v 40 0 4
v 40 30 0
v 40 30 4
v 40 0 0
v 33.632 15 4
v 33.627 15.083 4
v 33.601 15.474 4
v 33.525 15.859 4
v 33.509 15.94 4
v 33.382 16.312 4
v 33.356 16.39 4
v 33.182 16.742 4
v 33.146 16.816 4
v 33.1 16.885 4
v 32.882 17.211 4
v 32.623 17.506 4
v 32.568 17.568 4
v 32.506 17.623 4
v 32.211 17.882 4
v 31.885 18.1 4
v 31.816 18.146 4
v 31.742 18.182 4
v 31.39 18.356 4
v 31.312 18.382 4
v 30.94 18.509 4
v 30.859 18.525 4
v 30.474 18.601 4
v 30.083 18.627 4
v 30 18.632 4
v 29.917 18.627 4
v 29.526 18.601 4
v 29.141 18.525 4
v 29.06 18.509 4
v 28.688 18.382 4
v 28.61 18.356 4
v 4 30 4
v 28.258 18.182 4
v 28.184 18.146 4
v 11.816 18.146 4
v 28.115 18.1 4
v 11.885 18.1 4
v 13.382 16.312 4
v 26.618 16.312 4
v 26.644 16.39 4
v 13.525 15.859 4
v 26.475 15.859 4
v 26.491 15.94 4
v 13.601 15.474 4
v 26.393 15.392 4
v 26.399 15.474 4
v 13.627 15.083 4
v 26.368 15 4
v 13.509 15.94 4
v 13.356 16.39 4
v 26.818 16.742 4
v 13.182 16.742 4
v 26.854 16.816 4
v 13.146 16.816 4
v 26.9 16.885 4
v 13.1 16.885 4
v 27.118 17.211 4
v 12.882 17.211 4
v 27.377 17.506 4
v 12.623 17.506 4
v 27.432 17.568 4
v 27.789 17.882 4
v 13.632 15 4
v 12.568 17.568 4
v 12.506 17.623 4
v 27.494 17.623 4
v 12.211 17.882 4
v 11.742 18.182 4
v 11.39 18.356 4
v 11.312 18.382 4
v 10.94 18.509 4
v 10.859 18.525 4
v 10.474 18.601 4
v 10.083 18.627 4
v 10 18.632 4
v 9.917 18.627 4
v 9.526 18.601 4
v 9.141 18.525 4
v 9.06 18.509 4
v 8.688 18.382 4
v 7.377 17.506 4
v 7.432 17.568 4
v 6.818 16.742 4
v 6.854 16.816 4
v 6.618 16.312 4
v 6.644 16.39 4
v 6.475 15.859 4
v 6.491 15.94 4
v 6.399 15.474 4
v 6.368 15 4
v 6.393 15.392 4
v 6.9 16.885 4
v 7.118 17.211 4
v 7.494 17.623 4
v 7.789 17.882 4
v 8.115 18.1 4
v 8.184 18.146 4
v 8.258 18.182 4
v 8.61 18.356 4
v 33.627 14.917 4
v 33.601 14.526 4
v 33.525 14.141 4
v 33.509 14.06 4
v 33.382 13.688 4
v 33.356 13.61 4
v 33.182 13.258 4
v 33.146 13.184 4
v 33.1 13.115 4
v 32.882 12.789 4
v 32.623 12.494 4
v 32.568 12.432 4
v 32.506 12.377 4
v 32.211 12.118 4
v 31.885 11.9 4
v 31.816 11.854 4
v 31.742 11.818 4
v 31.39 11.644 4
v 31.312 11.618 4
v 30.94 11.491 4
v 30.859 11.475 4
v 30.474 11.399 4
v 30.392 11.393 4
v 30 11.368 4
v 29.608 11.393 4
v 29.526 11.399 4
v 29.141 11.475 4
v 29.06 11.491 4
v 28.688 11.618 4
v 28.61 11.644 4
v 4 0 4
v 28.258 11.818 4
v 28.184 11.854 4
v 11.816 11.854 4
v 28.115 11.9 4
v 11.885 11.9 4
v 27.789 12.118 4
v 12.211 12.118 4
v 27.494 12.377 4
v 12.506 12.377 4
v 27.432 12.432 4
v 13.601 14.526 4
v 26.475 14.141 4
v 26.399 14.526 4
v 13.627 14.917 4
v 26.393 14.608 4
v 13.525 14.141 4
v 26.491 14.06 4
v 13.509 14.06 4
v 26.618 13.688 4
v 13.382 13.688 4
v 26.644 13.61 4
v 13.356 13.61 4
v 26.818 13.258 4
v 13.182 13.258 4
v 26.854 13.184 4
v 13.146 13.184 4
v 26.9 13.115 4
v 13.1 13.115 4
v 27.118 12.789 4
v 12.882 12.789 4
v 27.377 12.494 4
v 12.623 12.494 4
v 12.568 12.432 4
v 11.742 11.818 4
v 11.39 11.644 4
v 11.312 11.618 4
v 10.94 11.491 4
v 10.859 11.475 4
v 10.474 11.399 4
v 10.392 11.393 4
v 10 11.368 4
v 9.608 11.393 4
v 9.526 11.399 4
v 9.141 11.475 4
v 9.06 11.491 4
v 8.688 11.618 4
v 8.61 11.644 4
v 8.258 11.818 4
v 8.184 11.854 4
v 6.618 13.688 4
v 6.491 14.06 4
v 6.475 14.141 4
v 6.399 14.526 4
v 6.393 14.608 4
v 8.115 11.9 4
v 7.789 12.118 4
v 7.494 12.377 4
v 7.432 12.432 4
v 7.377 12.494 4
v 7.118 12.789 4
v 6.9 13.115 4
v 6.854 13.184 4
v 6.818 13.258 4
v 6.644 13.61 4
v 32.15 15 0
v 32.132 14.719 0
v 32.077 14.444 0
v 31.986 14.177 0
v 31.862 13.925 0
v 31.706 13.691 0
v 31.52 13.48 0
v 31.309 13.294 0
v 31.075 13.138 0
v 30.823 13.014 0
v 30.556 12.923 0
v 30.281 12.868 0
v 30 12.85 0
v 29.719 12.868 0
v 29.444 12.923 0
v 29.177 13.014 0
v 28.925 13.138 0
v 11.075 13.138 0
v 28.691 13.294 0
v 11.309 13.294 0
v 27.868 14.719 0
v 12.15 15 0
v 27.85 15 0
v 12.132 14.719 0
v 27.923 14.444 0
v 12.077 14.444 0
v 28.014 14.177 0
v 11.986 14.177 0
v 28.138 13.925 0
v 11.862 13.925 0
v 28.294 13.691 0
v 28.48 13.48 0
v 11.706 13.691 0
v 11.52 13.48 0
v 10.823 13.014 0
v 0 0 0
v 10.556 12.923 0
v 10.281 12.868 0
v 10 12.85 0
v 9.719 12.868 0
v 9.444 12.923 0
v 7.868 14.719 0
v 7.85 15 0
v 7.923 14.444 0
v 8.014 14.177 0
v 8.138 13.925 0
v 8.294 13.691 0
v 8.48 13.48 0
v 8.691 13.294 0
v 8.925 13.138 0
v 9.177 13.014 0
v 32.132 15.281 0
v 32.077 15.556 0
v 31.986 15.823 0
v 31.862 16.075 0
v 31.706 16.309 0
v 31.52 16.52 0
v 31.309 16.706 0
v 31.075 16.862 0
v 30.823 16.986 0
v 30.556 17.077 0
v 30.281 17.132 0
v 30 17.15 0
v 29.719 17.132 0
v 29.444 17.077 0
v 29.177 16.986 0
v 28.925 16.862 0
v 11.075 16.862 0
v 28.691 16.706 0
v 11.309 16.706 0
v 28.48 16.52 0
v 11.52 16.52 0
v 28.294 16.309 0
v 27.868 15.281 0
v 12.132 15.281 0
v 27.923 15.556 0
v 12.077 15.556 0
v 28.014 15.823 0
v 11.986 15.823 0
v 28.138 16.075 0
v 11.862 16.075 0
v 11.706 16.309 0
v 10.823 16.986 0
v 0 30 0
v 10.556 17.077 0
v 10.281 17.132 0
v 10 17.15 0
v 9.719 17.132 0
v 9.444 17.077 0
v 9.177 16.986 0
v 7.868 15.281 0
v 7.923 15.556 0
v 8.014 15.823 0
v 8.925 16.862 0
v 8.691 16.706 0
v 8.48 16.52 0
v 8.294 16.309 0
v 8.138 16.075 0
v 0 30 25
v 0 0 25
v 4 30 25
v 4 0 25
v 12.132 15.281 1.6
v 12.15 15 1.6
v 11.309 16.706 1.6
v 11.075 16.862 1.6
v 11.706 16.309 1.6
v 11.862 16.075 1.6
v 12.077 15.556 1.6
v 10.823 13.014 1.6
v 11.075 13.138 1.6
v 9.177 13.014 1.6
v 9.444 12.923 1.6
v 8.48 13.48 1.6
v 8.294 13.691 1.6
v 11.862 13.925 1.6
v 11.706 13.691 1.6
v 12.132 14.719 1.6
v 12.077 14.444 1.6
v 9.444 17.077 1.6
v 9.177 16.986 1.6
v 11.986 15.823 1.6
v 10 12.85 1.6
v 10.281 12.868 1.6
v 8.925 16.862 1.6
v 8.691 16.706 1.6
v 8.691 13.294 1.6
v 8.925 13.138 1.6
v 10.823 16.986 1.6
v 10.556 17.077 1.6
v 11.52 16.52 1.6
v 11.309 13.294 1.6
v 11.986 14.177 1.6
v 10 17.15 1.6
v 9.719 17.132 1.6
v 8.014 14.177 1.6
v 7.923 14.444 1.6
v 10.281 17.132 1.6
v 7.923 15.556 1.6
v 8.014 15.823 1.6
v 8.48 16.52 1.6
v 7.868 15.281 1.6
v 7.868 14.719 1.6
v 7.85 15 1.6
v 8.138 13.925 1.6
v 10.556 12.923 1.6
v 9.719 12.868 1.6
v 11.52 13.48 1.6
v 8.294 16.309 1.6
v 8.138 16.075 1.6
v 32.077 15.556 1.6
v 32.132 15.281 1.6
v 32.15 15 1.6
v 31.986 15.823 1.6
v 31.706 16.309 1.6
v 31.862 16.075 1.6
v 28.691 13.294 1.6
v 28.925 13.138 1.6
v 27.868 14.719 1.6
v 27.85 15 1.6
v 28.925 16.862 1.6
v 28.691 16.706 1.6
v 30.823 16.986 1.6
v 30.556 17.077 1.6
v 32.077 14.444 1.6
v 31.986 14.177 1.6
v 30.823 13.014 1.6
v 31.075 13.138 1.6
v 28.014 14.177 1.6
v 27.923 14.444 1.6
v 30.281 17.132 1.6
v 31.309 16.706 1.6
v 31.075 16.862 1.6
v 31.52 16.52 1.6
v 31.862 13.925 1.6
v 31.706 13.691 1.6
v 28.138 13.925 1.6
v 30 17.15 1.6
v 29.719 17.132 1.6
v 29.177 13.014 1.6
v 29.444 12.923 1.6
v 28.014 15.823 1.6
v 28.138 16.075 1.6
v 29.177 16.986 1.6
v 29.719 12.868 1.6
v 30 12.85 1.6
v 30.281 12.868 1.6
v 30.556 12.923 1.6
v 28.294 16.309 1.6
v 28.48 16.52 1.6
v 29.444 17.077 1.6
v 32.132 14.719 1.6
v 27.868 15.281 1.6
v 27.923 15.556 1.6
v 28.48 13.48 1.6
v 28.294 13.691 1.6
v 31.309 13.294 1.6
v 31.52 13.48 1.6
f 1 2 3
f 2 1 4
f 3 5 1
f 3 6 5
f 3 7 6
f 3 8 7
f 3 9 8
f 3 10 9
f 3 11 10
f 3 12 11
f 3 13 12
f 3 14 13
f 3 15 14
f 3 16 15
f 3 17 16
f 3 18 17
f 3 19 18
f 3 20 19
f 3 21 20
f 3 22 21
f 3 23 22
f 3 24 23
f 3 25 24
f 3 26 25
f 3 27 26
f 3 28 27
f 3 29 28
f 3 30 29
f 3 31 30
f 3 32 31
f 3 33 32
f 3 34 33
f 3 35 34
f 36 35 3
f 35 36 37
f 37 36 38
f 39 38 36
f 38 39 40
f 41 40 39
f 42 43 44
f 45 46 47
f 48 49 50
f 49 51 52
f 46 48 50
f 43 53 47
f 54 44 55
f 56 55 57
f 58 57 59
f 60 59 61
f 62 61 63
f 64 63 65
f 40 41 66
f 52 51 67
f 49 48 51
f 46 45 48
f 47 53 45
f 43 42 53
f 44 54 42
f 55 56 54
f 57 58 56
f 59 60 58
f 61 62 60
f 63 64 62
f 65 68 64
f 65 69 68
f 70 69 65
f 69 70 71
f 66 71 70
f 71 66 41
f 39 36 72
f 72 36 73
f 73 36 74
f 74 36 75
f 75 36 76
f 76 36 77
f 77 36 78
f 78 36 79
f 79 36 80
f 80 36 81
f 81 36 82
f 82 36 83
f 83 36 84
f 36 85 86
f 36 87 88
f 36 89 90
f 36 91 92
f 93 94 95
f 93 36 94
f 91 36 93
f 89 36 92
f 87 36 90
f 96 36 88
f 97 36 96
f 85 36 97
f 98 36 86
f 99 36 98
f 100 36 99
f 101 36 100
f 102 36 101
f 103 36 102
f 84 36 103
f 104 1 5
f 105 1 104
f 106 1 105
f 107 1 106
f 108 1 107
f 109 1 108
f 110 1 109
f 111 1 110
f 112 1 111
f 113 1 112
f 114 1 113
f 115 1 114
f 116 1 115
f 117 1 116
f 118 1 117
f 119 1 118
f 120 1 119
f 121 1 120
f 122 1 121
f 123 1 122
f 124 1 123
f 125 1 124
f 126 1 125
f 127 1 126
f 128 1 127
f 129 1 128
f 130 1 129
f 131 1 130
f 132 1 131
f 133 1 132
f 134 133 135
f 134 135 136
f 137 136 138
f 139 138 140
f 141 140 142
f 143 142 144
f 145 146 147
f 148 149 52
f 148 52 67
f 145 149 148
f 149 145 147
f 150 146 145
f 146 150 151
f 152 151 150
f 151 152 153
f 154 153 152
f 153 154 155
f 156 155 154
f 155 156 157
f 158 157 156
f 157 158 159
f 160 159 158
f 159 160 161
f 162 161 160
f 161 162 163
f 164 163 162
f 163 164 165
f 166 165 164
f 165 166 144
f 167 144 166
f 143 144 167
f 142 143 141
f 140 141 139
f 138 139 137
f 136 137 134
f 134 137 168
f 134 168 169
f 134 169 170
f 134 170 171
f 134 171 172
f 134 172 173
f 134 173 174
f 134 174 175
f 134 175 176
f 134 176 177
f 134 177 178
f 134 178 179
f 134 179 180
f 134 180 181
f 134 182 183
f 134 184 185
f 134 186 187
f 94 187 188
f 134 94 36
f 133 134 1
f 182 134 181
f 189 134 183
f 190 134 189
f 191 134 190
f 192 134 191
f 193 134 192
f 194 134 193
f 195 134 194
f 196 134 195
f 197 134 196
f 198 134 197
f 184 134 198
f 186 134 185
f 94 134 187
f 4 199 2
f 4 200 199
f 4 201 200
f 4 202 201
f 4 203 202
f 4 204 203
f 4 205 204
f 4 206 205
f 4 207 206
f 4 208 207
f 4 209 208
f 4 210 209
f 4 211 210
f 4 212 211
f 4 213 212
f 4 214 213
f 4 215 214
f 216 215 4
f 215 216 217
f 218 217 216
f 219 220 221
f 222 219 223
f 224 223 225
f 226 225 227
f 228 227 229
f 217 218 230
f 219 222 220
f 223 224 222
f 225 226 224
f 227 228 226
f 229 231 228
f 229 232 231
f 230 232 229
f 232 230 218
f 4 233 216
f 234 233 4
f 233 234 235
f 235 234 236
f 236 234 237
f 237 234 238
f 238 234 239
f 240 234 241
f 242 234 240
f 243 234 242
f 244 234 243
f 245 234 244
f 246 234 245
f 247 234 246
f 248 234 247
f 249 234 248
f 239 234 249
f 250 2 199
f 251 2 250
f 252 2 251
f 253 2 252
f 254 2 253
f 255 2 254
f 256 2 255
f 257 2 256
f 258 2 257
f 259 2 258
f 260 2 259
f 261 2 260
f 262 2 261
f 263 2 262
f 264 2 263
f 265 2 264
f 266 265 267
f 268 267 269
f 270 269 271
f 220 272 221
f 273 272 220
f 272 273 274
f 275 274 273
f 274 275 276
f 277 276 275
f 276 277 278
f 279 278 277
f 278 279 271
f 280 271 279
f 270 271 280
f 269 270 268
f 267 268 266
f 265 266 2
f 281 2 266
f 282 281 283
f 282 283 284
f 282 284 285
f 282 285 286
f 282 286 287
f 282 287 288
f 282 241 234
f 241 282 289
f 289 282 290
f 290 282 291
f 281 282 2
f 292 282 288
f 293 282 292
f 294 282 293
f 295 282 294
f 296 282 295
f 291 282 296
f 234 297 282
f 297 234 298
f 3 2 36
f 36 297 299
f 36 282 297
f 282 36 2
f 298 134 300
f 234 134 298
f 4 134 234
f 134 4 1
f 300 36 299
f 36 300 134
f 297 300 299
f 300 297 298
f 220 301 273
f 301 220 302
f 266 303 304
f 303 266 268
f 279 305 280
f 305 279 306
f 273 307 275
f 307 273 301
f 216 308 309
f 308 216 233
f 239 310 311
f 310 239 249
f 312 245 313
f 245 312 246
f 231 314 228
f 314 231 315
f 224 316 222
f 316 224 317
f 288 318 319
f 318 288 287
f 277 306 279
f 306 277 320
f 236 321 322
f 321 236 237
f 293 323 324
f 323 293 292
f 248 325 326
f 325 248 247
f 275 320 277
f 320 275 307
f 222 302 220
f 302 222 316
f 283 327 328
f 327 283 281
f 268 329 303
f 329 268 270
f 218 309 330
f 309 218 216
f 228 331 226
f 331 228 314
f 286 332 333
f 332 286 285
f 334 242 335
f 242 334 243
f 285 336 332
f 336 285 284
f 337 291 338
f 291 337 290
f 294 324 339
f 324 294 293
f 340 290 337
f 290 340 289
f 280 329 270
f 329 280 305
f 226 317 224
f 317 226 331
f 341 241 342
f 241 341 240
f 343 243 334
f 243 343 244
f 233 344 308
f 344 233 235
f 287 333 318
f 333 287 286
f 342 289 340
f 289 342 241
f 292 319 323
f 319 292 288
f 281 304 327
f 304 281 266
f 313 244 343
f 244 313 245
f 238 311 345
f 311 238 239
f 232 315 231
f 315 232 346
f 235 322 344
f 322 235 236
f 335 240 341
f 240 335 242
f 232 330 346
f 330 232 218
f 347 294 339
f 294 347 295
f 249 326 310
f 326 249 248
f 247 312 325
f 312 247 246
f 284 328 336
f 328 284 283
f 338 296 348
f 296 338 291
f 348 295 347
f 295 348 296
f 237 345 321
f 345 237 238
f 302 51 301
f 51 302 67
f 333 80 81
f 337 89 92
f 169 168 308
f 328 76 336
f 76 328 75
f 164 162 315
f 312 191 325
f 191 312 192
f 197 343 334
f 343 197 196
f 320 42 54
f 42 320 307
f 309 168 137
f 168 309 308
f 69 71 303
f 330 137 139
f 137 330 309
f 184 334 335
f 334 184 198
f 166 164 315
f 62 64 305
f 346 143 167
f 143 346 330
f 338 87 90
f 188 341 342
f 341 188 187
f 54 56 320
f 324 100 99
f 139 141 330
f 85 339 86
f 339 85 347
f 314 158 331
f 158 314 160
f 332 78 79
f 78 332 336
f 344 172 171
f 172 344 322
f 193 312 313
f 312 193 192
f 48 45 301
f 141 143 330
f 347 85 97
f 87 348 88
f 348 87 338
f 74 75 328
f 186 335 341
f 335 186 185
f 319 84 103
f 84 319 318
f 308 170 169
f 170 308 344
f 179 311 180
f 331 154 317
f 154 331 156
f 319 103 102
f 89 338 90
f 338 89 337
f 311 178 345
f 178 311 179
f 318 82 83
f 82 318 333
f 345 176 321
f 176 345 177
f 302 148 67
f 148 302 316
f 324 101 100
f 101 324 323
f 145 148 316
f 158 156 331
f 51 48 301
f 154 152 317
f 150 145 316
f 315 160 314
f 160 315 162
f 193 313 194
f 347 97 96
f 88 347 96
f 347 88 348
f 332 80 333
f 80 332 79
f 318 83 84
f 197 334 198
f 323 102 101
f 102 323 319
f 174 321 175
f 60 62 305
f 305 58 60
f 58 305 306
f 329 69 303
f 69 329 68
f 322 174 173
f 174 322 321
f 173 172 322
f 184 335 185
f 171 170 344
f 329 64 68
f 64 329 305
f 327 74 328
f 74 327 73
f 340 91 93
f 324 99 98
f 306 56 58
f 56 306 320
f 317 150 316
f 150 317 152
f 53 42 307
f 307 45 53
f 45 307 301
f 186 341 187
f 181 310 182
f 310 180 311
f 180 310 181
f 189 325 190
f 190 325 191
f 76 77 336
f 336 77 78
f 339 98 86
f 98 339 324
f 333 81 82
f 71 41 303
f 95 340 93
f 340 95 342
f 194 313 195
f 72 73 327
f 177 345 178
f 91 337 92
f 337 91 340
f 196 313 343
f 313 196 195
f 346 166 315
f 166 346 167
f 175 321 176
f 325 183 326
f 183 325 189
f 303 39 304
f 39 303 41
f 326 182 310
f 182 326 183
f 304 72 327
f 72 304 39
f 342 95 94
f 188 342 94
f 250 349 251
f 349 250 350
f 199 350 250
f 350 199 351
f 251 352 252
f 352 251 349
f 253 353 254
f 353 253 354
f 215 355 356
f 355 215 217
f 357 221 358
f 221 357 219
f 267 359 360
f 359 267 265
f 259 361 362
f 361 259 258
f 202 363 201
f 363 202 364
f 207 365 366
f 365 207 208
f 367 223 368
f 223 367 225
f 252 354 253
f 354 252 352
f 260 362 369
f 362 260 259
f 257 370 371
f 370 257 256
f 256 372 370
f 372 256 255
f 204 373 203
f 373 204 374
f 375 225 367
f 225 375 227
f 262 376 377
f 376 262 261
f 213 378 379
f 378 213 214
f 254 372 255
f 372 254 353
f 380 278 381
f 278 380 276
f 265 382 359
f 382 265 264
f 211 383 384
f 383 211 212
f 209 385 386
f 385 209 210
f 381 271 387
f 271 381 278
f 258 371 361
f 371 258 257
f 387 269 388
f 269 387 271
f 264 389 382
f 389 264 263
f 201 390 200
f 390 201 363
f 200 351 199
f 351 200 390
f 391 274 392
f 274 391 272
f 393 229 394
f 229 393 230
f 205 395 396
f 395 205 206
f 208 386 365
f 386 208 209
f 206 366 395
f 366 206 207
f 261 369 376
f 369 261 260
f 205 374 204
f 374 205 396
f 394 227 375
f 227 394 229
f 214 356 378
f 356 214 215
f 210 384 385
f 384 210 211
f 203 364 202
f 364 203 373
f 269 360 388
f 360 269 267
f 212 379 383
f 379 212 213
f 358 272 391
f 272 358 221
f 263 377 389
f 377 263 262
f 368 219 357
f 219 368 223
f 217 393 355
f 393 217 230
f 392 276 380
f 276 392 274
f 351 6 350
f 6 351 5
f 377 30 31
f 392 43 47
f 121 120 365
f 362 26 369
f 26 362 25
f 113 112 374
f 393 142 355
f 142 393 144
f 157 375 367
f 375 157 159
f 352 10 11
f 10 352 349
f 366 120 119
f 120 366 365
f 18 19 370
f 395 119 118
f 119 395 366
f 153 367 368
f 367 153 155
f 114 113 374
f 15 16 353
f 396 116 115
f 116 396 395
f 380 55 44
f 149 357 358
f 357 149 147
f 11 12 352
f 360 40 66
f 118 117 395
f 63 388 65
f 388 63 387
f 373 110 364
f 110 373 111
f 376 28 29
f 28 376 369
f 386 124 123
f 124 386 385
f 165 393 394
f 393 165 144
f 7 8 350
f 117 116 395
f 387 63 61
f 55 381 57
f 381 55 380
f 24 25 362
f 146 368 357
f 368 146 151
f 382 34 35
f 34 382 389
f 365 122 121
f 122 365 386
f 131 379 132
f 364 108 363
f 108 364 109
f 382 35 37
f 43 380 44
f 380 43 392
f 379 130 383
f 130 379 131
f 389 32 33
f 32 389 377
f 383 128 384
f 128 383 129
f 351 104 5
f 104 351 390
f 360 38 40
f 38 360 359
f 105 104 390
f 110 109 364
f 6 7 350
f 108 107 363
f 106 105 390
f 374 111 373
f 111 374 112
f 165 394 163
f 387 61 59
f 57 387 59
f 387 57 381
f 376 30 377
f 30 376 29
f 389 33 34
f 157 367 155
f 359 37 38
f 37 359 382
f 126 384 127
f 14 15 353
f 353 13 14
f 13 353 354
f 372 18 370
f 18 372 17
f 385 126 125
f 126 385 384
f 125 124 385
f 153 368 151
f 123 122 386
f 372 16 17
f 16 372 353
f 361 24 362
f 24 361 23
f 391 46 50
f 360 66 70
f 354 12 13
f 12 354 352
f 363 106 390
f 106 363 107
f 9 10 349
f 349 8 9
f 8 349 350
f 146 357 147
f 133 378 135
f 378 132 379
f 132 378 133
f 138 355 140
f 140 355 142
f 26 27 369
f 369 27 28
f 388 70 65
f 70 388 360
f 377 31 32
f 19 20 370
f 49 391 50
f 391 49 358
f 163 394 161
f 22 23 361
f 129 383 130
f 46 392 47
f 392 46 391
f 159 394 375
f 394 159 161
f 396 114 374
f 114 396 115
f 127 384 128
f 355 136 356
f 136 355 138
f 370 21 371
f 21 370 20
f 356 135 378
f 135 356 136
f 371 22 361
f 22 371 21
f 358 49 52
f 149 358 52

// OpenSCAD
$fn = 48;
width = 40;
depth = 30;
height = 25;
thickness = 4;
hole_d = 4.3;
csink_d = 8.5;
csink_depth = 2.4;

difference() {
  union() {
    cube([width, depth, thickness]);
    cube([thickness, depth, height]);
  }
  for (x = [10, width - 10]) {
    translate([x, depth / 2, -1]) cylinder(h = thickness + 2, d = hole_d);
    translate([x, depth / 2, thickness - csink_depth])
      cylinder(h = csink_depth + 1, d1 = hole_d, d2 = csink_d);
  }
}
